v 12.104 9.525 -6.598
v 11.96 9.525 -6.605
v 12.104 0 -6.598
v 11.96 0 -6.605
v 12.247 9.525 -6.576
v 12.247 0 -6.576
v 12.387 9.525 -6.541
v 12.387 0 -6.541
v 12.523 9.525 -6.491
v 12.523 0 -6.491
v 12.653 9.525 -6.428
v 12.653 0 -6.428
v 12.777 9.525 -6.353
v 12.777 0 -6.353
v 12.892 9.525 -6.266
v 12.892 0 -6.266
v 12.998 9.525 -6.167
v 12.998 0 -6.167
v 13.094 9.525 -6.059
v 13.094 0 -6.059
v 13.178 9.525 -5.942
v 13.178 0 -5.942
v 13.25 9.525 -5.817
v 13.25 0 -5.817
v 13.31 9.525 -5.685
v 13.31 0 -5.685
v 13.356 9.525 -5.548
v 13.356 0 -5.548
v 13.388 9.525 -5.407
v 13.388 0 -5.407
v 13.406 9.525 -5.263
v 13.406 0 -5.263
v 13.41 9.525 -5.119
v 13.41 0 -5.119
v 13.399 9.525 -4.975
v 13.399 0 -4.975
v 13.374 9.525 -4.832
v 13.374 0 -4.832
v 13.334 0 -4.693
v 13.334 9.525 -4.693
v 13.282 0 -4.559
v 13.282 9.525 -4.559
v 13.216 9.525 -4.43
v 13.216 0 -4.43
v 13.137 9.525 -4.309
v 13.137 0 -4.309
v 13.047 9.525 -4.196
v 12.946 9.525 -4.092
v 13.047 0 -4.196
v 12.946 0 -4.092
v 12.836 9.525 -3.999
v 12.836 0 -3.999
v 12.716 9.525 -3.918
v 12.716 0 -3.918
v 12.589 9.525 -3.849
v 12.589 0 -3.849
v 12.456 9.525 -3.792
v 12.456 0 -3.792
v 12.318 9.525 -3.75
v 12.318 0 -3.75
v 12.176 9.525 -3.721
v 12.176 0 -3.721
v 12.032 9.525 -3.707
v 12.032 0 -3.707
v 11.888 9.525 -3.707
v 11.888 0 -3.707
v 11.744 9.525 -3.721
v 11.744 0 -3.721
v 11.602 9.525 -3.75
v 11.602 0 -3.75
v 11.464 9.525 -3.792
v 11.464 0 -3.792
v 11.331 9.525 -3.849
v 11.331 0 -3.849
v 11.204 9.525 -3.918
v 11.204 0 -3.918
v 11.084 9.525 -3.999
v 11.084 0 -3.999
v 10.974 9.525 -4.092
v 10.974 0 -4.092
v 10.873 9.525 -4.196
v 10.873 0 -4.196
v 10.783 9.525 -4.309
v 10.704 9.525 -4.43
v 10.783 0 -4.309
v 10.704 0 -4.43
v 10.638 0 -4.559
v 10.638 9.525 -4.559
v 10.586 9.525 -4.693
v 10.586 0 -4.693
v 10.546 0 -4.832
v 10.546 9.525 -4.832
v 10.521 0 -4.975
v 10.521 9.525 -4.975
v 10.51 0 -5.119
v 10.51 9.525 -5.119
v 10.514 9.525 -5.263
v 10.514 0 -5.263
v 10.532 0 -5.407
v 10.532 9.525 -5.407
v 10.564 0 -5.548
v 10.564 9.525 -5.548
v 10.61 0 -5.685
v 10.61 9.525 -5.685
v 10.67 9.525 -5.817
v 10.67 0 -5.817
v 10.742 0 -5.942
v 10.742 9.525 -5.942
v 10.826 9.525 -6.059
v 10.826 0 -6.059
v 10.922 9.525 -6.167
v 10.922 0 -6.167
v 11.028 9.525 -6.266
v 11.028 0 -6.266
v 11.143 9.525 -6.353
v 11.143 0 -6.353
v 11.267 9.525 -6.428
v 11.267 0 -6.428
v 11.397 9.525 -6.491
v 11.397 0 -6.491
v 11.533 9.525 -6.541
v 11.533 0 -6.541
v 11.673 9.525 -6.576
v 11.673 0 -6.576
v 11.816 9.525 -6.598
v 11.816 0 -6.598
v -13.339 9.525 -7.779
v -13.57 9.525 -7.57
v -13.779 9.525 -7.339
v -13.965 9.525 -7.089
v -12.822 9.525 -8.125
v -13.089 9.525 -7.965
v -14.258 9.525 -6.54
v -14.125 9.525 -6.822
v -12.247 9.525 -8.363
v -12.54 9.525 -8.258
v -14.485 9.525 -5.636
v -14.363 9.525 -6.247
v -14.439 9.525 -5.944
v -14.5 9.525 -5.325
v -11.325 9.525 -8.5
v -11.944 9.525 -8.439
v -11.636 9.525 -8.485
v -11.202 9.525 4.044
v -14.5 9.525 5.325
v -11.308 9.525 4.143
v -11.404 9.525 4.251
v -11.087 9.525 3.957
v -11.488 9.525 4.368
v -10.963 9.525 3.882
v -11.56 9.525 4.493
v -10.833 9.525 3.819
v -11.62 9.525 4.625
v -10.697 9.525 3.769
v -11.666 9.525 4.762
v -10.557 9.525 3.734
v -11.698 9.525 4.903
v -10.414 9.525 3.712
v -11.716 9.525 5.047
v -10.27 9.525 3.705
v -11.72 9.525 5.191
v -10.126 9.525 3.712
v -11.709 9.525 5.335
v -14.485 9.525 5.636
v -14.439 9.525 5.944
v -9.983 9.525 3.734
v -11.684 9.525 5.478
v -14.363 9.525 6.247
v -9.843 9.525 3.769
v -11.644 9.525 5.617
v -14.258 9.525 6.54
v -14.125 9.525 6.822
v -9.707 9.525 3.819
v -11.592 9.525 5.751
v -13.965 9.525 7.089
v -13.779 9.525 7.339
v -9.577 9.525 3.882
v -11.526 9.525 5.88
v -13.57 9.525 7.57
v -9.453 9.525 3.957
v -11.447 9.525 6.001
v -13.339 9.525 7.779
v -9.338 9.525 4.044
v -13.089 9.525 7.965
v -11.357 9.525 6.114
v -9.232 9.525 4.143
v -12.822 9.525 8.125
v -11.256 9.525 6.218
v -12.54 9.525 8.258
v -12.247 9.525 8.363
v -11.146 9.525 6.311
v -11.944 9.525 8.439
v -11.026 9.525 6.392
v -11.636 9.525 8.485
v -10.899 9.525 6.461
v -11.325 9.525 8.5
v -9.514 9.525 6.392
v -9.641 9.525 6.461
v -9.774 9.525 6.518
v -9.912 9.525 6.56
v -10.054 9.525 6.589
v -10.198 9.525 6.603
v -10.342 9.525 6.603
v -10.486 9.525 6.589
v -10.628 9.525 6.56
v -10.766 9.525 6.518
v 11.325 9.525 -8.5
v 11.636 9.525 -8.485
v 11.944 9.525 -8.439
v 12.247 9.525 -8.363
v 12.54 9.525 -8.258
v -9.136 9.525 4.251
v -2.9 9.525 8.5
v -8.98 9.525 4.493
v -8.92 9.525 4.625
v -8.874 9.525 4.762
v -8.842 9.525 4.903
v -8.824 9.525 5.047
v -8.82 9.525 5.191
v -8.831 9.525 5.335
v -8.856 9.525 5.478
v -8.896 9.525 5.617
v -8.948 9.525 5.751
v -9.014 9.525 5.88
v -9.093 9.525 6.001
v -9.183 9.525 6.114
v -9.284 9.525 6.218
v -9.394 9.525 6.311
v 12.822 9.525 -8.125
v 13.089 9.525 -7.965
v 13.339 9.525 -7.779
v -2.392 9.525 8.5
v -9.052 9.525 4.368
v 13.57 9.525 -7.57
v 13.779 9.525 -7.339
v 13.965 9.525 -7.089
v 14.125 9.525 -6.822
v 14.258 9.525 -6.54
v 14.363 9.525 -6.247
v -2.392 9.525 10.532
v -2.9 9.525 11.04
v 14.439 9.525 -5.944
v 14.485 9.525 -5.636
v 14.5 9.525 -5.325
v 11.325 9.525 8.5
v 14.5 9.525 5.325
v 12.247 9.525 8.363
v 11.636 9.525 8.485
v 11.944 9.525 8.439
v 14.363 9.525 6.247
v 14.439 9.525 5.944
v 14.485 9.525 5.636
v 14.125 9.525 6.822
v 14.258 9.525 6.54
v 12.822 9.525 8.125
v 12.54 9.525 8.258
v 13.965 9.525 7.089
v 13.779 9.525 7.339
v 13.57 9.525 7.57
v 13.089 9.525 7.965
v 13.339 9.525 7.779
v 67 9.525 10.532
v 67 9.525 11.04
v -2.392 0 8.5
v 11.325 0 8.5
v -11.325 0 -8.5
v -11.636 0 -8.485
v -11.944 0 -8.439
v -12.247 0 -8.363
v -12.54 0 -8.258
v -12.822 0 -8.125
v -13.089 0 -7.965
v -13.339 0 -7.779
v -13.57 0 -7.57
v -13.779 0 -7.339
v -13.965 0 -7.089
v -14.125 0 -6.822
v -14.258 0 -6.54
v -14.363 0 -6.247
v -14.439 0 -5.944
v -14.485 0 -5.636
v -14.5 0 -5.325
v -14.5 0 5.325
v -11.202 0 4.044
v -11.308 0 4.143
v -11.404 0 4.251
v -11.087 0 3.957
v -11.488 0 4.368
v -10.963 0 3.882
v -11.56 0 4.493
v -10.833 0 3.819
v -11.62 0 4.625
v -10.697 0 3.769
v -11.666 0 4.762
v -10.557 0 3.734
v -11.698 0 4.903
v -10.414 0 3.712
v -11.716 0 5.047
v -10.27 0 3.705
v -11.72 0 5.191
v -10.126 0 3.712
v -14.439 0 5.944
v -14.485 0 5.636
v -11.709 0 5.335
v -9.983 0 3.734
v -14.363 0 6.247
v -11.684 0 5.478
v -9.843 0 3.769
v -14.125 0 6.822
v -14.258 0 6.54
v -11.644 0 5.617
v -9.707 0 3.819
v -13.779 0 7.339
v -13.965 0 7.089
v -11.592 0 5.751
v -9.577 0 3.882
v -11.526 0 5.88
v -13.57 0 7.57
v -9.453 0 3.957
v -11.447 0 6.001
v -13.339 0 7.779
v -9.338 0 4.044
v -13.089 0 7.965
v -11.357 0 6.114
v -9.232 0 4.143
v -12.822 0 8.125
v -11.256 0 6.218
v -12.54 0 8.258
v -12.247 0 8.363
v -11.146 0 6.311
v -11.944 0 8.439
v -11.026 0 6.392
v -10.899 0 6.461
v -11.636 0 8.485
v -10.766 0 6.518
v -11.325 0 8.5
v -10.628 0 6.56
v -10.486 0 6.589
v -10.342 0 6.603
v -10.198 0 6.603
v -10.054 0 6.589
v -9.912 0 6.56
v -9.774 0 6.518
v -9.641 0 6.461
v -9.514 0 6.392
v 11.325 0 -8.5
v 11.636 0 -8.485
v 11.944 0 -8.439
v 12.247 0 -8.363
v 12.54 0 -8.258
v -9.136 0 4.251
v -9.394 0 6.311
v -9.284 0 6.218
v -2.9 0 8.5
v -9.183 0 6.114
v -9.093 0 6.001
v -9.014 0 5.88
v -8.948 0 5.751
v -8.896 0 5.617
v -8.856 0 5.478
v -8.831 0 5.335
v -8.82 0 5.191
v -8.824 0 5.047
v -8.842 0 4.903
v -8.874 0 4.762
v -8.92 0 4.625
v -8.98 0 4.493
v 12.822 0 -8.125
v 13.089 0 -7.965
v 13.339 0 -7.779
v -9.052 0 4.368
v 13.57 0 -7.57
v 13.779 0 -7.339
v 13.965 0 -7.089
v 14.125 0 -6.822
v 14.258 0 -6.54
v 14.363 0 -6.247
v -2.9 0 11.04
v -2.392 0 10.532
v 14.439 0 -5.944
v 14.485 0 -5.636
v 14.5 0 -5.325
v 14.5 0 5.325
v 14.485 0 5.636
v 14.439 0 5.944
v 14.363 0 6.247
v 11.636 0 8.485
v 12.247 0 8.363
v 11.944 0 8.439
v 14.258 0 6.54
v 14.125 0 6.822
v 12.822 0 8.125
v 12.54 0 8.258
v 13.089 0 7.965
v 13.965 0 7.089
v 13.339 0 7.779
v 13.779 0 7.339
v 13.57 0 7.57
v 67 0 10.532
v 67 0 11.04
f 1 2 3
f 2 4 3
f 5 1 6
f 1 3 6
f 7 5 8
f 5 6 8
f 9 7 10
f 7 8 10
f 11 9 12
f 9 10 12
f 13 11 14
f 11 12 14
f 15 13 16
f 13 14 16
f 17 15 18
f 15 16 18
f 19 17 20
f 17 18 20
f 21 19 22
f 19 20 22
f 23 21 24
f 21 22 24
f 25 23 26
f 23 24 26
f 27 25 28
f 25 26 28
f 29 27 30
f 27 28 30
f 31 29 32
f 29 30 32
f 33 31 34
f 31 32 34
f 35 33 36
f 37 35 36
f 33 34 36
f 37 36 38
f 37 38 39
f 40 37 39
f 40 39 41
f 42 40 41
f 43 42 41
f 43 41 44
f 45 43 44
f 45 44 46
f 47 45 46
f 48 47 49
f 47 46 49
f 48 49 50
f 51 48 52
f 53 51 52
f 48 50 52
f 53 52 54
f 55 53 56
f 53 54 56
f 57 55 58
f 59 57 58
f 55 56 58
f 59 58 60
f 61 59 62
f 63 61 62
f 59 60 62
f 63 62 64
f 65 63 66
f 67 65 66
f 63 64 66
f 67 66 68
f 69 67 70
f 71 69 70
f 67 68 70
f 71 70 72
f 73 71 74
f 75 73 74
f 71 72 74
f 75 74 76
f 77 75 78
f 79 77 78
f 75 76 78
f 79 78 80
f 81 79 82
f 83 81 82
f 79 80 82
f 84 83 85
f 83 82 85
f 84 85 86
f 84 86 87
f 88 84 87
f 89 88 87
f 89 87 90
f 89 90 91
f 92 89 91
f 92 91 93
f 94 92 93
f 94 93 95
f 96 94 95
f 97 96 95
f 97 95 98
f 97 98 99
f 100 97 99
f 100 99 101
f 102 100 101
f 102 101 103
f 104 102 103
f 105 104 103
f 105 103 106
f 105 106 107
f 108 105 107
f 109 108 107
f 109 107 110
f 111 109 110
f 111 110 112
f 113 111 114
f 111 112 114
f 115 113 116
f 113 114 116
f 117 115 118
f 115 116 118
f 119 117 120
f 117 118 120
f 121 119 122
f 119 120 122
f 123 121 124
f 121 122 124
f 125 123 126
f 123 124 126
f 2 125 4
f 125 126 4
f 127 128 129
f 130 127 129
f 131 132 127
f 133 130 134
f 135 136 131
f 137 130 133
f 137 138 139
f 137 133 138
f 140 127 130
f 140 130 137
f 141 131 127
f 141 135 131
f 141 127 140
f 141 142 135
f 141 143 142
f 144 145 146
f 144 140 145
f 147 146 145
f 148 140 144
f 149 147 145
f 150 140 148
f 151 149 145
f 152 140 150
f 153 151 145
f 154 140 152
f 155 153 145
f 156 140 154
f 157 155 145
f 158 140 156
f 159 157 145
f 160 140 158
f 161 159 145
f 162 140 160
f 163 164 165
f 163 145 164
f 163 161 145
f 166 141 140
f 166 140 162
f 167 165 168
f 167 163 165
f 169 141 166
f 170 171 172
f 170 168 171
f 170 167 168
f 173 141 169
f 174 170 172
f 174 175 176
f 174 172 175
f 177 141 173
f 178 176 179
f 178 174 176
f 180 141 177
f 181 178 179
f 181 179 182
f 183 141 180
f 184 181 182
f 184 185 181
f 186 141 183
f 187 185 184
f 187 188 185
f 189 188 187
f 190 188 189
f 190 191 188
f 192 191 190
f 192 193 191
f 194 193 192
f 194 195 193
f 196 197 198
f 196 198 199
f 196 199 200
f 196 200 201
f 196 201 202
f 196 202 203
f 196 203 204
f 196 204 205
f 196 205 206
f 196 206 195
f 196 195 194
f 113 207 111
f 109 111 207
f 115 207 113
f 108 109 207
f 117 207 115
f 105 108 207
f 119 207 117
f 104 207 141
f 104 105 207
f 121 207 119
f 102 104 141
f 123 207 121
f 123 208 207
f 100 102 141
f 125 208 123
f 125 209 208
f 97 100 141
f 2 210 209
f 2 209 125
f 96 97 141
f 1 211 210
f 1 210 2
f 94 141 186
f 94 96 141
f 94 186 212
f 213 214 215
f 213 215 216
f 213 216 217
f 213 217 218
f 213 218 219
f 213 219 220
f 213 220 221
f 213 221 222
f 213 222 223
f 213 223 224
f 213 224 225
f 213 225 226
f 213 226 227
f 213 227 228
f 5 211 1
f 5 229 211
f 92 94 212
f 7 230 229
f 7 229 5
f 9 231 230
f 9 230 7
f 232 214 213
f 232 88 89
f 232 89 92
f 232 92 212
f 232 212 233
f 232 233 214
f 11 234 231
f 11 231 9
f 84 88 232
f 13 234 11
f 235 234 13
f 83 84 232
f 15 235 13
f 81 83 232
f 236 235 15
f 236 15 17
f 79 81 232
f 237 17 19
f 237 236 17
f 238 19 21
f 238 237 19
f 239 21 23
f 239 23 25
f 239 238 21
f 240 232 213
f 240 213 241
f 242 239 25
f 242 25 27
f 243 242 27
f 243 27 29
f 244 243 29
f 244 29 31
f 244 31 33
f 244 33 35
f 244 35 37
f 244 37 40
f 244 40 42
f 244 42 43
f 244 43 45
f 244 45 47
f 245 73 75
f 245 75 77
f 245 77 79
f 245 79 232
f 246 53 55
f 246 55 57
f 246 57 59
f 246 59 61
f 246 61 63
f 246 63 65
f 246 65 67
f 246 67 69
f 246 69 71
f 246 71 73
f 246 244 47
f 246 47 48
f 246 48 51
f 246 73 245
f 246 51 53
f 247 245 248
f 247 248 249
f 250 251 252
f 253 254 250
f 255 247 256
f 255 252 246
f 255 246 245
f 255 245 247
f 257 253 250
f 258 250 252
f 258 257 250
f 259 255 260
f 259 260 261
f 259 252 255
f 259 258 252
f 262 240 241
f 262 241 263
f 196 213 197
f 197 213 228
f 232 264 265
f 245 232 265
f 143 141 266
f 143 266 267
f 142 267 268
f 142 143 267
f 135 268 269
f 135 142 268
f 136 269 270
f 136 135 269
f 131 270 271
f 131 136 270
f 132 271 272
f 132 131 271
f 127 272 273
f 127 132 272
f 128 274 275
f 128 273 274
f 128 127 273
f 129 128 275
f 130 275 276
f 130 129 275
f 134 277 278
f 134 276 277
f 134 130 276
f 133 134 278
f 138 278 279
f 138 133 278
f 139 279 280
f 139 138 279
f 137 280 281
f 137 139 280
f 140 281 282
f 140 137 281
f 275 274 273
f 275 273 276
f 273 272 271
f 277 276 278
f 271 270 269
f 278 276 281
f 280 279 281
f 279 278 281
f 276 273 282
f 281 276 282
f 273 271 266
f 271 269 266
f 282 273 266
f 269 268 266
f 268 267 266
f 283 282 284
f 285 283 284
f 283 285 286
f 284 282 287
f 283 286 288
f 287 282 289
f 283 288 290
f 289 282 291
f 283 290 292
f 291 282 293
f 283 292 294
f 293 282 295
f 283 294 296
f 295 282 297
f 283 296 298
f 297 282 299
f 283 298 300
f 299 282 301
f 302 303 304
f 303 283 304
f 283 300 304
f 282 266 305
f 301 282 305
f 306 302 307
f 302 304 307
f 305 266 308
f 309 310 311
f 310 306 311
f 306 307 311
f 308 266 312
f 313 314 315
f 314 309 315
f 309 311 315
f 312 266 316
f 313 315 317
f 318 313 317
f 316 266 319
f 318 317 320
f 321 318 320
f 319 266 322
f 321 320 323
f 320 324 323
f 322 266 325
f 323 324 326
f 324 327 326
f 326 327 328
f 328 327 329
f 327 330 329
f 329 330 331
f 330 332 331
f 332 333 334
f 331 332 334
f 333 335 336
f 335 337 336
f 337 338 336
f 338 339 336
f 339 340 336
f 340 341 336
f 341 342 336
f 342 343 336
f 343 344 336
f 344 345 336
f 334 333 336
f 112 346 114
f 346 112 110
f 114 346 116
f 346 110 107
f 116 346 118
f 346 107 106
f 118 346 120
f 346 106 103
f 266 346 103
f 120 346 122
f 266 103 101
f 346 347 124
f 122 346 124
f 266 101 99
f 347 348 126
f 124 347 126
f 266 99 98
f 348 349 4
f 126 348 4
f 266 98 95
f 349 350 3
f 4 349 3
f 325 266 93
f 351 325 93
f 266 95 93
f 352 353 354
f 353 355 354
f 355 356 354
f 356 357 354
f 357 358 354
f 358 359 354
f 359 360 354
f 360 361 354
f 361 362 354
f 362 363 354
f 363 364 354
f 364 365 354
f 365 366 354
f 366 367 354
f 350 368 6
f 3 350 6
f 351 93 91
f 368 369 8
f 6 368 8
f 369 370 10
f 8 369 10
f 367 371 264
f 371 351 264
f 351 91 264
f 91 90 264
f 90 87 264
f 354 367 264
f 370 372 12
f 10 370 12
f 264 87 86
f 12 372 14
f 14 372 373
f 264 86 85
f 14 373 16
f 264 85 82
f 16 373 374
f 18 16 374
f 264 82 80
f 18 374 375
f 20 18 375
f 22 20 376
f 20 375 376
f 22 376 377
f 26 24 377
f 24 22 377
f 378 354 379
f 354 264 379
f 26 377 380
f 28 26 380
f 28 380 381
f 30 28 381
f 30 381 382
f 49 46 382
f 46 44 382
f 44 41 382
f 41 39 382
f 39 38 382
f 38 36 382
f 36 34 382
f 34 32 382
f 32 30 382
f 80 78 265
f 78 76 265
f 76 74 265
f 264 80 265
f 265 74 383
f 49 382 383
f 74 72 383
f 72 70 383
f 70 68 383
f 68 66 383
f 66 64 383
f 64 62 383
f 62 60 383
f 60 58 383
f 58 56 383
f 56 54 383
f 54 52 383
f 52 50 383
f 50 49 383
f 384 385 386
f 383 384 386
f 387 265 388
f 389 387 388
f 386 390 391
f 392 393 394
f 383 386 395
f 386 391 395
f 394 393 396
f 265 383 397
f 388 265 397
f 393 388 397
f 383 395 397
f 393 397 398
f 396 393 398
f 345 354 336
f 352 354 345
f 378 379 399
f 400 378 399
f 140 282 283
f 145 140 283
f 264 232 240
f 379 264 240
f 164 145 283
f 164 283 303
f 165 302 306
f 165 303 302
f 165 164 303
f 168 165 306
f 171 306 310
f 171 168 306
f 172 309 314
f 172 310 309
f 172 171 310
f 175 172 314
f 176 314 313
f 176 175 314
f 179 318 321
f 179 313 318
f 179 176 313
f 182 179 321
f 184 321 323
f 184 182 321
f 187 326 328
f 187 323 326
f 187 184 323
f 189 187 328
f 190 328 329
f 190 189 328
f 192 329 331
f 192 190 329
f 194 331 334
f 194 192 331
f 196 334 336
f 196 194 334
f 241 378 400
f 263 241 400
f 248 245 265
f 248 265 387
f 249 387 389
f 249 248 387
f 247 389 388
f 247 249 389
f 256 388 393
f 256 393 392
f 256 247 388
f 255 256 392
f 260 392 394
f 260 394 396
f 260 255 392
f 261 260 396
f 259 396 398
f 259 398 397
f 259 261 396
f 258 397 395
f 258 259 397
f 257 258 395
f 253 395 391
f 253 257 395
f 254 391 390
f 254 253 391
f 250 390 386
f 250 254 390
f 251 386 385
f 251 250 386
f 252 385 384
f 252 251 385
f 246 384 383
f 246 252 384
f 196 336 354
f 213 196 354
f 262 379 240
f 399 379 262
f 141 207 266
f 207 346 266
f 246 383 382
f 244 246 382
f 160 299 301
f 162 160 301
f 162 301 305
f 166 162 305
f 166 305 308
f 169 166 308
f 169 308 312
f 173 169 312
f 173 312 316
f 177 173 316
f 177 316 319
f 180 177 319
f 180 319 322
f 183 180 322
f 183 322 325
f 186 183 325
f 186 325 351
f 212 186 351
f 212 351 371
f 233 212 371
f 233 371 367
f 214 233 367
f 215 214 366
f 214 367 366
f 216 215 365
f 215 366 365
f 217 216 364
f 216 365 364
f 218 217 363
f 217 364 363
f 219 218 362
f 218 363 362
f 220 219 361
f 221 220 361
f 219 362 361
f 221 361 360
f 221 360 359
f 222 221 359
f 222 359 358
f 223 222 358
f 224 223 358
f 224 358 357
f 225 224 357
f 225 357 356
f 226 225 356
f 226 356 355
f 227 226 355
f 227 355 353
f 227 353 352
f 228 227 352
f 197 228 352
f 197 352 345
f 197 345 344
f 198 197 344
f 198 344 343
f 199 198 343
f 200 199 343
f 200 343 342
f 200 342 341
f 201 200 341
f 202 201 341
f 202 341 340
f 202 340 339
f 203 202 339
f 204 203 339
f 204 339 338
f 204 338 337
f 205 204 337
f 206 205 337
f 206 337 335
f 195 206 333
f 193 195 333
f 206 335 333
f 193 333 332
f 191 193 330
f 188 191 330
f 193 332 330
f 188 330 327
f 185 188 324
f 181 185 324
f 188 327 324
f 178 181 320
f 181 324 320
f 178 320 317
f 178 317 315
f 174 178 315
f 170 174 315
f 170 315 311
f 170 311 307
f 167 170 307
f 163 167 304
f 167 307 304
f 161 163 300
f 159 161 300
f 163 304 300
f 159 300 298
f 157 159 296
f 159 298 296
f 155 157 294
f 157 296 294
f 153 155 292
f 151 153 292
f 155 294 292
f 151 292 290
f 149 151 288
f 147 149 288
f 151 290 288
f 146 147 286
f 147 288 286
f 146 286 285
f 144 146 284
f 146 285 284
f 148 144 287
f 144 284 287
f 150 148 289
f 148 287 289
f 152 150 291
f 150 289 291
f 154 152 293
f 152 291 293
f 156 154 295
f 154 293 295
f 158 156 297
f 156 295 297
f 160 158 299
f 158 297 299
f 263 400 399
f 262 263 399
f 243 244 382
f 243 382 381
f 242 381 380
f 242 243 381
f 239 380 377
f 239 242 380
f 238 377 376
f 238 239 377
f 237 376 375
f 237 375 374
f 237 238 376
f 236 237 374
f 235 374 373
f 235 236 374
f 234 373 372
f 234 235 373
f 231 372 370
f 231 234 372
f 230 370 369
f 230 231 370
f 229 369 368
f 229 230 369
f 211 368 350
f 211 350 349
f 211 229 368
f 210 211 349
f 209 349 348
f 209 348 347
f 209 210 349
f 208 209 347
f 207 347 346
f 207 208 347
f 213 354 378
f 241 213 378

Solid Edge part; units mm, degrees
sketch "Sketch1" plane through (0, 0, 0) normal (0, -1, 0) x (1, 0, 0)
  line L0 (-14.5, 8.5) -> (14.5, 8.5)
  line L1 (14.5, 8.5) -> (14.5, -8.5)
  line L2 (14.5, -8.5) -> (-14.5, -8.5)
  line L3 (-14.5, -8.5) -> (-14.5, 8.5)
  dimension "D1" = 17
  dimension "D2" = 29
extrude "Protrusion1" add sketch "Sketch1" against normal blind 9.525
hole "Hole_1" at (11.96, 0, -5.155) direction (0, 1, 0) diameter 2.9 end up to next
hole "Hole1" at (-10.27, 0, 5.155) direction (0, 1, 0) diameter 2.9 end up to next
fillet "Round_1" radius 3.175 4 edges at (14.5, 4.7625, -8.5) (-14.5, 4.7625, -8.5) (-14.5, 4.7625, 8.5) (14.5, 4.7625, 8.5)
sketch "Sketch2" plane through (0, 0, 0) normal (0, -1, 0) x (1, 0, 0)
  line L0 (-2.9, 8.5) -> (-2.9, 11.04)
  line L1 (-2.9, 11.04) -> (67, 11.04)
  line L2 (67, 11.04) -> (67, 10.532)
  line L3 (-2.392, 10.532) -> (67, 10.532)
  line L4 (-2.392, 8.5) -> (-2.392, 10.532)
  dimension "D1" = 2.54
  dimension "D2" = 0.508
  dimension "D3" = 11.6
  dimension "D4" = 69.9
extrude "Protrusion2" add sketch "Sketch2" against normal up to vertex (9.525 mm away) material side at (-2.85, 0, 9.77)
